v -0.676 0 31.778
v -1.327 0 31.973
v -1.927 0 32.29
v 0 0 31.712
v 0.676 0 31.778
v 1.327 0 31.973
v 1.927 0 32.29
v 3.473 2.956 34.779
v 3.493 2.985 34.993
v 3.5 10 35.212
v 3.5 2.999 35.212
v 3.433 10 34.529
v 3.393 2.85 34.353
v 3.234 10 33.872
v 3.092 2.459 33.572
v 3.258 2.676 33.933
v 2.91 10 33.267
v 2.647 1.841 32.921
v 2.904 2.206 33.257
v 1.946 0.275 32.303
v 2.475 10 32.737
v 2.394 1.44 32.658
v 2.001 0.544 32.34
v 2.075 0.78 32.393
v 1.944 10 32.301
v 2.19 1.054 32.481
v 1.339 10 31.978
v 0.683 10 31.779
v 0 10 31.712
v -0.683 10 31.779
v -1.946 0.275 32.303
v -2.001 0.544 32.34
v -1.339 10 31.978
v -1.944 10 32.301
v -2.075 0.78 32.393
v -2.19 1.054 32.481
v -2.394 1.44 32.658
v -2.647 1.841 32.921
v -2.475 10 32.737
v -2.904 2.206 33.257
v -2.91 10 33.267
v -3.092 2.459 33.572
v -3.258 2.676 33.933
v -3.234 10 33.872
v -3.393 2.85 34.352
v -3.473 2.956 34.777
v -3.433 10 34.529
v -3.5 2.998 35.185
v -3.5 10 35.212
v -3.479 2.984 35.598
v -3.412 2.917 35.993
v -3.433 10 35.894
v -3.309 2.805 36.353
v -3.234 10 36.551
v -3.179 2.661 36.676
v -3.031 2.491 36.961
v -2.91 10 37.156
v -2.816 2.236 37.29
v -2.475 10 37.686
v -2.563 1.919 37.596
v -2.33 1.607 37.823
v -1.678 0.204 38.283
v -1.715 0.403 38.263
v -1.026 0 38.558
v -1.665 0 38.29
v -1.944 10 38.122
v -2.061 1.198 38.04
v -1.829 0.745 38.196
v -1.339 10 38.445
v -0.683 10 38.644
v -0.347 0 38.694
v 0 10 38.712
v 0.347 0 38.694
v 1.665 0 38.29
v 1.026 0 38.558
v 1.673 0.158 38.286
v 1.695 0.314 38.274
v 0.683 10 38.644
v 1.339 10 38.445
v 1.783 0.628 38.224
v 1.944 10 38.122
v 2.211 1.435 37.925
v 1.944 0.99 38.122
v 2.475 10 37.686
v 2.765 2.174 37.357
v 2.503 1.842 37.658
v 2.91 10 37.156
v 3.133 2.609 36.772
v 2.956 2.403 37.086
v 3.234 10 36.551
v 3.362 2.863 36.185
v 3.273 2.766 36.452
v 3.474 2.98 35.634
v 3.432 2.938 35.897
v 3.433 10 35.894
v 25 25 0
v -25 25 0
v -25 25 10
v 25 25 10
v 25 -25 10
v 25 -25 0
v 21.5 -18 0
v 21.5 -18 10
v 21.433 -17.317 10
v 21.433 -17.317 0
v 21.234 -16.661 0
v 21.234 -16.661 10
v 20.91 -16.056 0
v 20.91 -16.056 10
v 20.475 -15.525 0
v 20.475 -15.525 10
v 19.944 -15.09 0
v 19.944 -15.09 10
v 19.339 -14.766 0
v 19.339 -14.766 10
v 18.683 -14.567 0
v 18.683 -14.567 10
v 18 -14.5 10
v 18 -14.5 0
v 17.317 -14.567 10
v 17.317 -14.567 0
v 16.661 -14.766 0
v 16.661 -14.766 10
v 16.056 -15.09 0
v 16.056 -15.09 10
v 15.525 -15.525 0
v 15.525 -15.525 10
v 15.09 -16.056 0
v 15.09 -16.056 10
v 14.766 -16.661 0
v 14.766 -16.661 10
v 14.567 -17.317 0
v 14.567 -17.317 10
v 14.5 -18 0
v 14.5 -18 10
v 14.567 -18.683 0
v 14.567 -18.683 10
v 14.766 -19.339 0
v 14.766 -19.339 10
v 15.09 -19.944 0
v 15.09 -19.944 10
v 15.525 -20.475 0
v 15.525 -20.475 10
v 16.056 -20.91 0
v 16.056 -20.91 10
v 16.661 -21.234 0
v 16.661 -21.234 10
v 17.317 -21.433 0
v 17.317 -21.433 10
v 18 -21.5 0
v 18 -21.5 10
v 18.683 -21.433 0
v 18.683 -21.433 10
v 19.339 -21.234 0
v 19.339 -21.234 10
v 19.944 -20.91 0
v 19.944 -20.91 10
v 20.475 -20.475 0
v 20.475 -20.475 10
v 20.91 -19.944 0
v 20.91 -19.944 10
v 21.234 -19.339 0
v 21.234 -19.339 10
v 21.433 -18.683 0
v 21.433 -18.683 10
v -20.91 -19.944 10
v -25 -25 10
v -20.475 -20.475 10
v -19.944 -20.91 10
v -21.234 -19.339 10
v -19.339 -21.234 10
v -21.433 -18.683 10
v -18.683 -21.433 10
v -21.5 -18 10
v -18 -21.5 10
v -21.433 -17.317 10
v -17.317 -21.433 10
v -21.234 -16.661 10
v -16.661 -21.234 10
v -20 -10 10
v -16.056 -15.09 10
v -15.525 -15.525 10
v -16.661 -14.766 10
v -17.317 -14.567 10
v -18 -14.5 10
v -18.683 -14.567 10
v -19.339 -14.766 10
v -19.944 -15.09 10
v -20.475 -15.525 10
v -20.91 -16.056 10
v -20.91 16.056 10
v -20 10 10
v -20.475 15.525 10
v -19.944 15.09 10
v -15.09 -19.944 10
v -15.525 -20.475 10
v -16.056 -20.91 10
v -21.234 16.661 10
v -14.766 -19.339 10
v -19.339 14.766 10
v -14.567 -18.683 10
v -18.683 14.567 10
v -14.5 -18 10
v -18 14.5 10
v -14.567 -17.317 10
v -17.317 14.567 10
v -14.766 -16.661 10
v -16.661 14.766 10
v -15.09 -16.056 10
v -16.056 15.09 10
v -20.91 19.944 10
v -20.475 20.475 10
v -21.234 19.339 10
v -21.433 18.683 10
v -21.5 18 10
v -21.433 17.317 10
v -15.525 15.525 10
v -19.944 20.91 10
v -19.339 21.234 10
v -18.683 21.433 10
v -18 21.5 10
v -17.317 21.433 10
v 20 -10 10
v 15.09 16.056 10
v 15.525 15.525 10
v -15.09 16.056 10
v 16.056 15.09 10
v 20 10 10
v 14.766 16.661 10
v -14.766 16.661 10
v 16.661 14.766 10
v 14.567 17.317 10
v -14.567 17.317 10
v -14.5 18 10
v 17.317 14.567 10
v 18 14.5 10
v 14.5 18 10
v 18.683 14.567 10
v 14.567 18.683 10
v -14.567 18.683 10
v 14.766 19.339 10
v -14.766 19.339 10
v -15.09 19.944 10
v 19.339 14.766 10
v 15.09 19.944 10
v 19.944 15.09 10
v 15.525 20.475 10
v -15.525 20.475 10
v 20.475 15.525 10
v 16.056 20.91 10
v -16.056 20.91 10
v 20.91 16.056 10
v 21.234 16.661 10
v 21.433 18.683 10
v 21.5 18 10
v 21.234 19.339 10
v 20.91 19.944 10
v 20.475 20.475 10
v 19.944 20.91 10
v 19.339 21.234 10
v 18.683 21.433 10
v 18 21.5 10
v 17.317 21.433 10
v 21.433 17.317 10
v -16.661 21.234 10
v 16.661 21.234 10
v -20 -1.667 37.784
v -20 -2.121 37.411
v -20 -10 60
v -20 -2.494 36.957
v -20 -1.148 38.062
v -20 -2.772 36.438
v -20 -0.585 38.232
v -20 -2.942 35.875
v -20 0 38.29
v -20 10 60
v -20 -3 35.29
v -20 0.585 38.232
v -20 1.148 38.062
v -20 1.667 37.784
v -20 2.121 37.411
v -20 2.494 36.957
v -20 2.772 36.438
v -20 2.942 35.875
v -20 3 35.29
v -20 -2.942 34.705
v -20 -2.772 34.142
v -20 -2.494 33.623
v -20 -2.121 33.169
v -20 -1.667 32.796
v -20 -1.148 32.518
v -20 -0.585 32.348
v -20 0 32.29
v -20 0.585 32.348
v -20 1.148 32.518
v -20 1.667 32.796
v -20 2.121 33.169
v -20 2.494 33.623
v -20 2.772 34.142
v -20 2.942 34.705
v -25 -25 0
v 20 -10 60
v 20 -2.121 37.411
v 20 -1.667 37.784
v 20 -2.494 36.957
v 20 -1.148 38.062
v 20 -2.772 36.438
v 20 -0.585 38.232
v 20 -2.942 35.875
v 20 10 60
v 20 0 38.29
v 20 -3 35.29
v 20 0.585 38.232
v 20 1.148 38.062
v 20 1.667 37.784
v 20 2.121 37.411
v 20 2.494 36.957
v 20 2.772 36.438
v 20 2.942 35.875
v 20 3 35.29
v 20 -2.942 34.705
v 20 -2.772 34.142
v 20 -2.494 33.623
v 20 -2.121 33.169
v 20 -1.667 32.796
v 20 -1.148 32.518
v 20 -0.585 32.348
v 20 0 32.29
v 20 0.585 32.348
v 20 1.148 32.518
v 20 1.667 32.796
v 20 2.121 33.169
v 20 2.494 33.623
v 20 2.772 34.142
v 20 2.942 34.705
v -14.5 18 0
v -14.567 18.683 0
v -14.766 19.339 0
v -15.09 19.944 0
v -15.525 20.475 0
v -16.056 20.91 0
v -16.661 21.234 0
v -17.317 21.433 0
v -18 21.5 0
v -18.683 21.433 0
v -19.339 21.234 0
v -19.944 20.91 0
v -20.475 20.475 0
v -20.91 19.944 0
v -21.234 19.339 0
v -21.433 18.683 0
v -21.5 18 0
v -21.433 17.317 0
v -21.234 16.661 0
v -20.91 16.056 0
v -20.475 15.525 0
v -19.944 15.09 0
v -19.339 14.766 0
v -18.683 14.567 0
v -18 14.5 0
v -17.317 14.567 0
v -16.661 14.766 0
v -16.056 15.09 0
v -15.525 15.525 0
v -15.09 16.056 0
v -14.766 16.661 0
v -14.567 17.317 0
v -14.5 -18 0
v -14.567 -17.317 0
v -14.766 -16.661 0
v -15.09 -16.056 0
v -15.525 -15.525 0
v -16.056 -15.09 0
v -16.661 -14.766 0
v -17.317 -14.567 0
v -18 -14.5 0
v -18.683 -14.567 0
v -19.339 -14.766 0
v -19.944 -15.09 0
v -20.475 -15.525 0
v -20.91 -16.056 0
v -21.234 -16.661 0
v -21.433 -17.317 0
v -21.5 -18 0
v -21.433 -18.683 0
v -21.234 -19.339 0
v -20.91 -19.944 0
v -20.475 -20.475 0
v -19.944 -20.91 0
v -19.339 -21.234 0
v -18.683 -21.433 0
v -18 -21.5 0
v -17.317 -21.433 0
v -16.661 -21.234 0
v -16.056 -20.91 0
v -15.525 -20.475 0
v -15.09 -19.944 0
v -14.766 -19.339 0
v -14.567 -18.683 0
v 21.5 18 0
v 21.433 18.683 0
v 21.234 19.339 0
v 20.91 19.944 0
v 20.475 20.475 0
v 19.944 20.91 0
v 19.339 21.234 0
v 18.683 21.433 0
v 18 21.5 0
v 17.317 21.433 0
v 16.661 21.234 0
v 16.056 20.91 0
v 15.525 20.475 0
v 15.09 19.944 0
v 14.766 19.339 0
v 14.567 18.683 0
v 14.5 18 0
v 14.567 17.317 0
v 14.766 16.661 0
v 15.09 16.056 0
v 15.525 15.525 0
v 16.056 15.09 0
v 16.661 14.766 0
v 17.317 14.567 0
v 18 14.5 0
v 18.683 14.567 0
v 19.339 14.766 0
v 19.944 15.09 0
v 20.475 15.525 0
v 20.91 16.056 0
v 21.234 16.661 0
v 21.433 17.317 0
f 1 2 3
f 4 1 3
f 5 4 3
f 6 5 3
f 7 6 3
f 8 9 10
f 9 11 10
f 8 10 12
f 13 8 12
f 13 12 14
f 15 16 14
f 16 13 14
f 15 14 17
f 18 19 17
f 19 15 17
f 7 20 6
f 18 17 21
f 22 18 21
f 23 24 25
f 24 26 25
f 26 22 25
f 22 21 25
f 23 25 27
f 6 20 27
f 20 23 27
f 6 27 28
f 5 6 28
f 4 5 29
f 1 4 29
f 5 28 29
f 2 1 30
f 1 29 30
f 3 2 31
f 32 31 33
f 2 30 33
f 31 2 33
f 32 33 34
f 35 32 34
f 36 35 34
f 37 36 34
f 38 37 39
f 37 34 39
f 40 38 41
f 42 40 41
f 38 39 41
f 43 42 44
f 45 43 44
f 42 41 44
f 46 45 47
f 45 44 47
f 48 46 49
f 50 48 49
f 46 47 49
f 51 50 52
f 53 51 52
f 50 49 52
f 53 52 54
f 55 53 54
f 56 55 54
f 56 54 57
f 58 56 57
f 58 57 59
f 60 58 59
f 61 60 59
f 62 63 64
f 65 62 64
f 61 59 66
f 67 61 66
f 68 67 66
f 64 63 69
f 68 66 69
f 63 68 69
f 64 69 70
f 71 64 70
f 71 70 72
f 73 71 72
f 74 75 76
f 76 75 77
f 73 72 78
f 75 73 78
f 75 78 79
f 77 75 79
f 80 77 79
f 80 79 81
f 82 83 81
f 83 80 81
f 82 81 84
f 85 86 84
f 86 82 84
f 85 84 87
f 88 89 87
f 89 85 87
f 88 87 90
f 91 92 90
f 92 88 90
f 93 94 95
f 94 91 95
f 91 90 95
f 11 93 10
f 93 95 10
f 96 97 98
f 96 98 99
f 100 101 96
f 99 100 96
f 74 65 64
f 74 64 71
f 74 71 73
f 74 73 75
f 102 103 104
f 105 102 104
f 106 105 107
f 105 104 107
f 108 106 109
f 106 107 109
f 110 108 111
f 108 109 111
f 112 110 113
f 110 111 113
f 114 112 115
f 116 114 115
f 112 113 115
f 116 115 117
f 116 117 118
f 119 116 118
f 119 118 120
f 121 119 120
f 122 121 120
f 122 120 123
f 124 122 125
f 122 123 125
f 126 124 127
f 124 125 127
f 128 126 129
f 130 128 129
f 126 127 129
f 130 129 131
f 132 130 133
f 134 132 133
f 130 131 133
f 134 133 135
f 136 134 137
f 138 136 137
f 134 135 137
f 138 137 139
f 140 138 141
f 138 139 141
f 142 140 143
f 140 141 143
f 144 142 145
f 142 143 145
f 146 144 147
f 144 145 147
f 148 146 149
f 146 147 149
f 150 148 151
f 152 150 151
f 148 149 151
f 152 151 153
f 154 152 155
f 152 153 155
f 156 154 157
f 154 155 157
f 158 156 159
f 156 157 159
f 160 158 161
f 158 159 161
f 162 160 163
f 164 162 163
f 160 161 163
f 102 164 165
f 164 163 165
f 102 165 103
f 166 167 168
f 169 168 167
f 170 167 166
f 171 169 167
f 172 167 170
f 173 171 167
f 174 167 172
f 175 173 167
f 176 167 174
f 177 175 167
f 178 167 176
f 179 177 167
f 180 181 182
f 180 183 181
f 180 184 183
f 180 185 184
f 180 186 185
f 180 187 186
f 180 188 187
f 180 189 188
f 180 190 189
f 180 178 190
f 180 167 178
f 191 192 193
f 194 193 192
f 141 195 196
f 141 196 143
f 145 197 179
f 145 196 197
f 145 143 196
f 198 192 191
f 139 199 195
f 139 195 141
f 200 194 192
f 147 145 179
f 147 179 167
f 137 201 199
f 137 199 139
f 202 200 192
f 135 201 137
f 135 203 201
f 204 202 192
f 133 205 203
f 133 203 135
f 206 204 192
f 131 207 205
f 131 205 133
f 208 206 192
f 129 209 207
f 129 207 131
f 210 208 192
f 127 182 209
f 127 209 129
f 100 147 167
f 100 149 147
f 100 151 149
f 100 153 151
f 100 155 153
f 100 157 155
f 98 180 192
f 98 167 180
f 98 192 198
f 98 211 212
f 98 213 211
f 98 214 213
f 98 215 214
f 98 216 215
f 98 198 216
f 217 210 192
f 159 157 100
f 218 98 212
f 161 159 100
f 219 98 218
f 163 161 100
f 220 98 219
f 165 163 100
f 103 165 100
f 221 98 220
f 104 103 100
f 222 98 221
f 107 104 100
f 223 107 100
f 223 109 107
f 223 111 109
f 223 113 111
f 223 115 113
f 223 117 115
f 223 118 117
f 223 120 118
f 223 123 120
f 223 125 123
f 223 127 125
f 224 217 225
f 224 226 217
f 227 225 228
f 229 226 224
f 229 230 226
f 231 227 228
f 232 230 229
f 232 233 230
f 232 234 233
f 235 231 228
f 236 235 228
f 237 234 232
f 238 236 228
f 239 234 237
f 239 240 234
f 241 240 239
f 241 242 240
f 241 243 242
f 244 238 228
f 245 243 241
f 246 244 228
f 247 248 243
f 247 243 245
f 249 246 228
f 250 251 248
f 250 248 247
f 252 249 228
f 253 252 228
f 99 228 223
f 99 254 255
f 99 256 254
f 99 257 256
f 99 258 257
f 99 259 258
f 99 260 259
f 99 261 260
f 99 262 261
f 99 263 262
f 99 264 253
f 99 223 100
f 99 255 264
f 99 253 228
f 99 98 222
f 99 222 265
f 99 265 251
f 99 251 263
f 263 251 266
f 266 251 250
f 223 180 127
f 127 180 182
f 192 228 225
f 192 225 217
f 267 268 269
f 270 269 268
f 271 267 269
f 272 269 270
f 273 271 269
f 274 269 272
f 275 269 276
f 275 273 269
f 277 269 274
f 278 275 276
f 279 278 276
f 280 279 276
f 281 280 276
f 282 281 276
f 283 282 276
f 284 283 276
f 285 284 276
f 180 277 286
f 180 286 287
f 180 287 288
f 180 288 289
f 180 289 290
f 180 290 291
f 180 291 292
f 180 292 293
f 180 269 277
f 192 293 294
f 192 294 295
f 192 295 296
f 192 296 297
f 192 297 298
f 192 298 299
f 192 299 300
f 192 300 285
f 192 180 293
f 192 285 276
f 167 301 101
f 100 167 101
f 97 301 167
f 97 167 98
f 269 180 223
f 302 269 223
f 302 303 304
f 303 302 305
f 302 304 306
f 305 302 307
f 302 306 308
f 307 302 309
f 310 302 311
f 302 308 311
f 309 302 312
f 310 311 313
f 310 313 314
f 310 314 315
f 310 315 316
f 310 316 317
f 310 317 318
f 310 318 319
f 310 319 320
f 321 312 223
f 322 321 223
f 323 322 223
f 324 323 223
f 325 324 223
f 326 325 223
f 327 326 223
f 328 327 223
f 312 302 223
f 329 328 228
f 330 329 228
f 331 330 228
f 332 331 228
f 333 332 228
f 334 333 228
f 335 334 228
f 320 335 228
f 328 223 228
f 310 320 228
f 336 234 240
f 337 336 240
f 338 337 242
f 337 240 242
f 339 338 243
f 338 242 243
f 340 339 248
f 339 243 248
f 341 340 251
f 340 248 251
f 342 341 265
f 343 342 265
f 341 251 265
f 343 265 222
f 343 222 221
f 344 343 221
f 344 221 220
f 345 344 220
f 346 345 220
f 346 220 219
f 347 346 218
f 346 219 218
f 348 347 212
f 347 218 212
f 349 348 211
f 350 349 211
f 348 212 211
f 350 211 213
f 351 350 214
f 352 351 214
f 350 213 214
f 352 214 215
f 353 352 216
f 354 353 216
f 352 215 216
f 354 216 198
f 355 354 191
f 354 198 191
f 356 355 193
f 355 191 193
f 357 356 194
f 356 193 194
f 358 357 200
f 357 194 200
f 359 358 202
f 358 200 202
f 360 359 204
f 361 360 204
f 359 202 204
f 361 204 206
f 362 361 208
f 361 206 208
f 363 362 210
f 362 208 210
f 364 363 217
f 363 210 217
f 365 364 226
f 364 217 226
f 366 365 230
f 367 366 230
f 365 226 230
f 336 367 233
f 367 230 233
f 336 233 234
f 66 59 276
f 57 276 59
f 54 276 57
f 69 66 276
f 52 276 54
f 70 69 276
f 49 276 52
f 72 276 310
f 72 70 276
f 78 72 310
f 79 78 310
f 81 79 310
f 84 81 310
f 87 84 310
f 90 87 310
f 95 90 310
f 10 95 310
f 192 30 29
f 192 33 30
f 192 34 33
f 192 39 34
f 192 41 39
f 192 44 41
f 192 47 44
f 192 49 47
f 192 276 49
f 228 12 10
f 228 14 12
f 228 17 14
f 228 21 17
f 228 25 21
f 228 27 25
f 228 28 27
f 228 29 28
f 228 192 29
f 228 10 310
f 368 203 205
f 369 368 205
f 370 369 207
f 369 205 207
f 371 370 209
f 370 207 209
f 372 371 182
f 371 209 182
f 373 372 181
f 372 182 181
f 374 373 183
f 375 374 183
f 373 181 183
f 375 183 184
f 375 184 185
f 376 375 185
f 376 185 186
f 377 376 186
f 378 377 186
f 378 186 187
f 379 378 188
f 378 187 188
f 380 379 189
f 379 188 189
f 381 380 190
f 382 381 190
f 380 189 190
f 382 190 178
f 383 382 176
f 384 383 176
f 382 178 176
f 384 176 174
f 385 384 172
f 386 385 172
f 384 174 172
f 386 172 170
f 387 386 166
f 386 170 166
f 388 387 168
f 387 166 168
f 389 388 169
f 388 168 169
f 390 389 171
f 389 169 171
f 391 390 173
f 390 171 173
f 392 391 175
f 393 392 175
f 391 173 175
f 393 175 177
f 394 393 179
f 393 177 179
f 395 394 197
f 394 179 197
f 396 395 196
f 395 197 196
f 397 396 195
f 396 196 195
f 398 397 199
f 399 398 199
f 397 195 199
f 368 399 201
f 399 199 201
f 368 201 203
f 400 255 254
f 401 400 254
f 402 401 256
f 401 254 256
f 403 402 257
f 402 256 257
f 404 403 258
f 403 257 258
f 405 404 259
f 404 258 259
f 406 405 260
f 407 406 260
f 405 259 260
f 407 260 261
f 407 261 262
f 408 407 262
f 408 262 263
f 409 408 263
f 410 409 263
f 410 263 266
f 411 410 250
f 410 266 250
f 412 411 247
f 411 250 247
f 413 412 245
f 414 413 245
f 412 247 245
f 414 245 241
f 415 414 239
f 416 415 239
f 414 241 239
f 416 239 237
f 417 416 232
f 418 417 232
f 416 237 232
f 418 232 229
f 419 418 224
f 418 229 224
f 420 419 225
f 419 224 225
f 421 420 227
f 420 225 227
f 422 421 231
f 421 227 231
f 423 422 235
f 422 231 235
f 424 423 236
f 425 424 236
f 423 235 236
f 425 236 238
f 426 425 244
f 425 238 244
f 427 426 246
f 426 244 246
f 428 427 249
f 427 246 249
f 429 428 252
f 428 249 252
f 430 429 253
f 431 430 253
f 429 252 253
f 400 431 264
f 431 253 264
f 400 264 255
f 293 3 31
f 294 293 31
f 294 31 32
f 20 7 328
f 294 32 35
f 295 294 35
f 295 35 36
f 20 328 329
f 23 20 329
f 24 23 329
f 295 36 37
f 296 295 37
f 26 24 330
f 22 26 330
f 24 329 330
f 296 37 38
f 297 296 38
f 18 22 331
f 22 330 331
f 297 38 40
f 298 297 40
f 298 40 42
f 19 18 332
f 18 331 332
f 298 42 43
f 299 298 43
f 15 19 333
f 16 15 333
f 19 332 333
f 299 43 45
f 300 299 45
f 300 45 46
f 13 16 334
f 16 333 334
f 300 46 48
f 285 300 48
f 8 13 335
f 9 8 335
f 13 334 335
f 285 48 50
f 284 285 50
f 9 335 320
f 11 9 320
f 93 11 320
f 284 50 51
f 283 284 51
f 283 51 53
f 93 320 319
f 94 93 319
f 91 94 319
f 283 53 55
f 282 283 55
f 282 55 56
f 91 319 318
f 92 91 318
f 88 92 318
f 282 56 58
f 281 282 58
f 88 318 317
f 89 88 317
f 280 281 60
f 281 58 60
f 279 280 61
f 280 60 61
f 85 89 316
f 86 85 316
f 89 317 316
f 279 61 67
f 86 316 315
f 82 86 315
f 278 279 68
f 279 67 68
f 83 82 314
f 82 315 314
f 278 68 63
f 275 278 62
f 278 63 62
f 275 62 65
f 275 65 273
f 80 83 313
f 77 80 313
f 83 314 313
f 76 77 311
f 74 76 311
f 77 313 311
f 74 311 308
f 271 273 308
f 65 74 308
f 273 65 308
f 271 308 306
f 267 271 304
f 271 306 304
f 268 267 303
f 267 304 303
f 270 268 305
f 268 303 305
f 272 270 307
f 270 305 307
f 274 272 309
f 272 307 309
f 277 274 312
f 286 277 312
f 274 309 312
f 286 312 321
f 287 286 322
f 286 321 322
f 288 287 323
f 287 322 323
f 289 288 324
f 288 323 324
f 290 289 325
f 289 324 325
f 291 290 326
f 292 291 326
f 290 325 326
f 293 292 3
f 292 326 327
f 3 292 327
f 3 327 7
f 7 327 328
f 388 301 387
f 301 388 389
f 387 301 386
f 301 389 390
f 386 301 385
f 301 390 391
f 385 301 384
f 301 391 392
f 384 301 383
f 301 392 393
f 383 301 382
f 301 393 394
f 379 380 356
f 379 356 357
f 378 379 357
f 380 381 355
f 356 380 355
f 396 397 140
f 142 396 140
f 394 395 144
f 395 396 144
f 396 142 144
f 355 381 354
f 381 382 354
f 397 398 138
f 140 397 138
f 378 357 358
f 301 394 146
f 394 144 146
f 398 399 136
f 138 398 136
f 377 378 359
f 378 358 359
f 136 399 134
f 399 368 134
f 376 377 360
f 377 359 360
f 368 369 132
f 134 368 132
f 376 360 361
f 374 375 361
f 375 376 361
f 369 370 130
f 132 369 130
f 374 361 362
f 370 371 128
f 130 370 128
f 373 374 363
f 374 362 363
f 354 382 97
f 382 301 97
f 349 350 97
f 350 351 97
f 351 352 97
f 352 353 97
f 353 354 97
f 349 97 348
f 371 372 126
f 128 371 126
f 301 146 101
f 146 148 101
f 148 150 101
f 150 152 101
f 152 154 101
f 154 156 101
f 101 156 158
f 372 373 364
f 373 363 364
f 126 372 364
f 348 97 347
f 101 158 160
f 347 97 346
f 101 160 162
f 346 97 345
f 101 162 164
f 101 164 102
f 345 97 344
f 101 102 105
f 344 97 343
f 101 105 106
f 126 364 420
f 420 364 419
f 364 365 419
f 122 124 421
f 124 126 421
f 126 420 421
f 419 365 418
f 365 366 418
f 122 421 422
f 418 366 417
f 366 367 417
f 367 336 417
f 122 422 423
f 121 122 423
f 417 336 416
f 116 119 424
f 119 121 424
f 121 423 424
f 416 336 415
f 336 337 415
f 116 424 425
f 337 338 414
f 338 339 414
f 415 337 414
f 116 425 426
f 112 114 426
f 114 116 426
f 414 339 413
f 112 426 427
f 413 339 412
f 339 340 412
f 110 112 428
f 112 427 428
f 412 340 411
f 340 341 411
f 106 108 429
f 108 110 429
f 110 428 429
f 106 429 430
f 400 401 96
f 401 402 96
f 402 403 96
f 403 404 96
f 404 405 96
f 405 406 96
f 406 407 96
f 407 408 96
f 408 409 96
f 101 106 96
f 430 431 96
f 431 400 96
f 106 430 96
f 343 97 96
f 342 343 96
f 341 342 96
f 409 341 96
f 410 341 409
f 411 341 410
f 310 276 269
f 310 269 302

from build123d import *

# Parameters (mm, degrees)
SKETCH1_W           = 50
SKETCH1_H           = 50
BOSS_EXTRUDE1_DEPTH = 10
SKETCH2_W           = 40
SKETCH2_H           = 20
BOSS_EXTRUDE2_DEPTH = 50
SKETCH3_R           = 3.5
CUT_EXTRUDE1_DEPTH  = 10
SKETCH4_R           = 3
CUT_EXTRUDE2_DEPTH  = 46
SKETCH5_R           = 3.5
CUT_EXTRUDE3_DEPTH  = 10


with BuildPart() as part:
    # Sketch1 → Boss-Extrude1 (new body)
    with BuildSketch(Plane.XY):
        Rectangle(SKETCH1_W, SKETCH1_H)
    extrude(amount=BOSS_EXTRUDE1_DEPTH)

    # Sketch2 → Boss-Extrude2 (add)
    with BuildSketch(Plane.XY.offset(10)):
        Rectangle(SKETCH2_W, SKETCH2_H)
    extrude(amount=BOSS_EXTRUDE2_DEPTH)

    # Sketch3 → Cut-Extrude1 (cut)
    with BuildSketch(Plane.XY.offset(10)):
        with Locations((-18, 18)):
            Circle(SKETCH3_R)
        with Locations((18, 18)):
            Circle(SKETCH3_R)
        with Locations((18, -18)):
            Circle(SKETCH3_R)
        with Locations((-18, -18)):
            Circle(SKETCH3_R)
    extrude(amount=-CUT_EXTRUDE1_DEPTH, mode=Mode.SUBTRACT)

    # Sketch4 → Cut-Extrude2 (cut, through all)
    with BuildSketch(Plane(origin=(20, 0, 0), x_dir=(0, 0, -1), z_dir=(1, 0, 0))):
        with Locations((-35.289984846, 0)):
            Circle(SKETCH4_R)
    extrude(amount=-CUT_EXTRUDE2_DEPTH, mode=Mode.SUBTRACT)

    # Sketch5 → Cut-Extrude3 (cut)
    with BuildSketch(Plane(origin=(0, 10, 0), x_dir=(1, 0, 0), z_dir=(0, 1, 0))):
        with Locations((0, -35.211614701)):
            Circle(SKETCH5_R)
    extrude(amount=-CUT_EXTRUDE3_DEPTH, mode=Mode.SUBTRACT)


solid = part.part
